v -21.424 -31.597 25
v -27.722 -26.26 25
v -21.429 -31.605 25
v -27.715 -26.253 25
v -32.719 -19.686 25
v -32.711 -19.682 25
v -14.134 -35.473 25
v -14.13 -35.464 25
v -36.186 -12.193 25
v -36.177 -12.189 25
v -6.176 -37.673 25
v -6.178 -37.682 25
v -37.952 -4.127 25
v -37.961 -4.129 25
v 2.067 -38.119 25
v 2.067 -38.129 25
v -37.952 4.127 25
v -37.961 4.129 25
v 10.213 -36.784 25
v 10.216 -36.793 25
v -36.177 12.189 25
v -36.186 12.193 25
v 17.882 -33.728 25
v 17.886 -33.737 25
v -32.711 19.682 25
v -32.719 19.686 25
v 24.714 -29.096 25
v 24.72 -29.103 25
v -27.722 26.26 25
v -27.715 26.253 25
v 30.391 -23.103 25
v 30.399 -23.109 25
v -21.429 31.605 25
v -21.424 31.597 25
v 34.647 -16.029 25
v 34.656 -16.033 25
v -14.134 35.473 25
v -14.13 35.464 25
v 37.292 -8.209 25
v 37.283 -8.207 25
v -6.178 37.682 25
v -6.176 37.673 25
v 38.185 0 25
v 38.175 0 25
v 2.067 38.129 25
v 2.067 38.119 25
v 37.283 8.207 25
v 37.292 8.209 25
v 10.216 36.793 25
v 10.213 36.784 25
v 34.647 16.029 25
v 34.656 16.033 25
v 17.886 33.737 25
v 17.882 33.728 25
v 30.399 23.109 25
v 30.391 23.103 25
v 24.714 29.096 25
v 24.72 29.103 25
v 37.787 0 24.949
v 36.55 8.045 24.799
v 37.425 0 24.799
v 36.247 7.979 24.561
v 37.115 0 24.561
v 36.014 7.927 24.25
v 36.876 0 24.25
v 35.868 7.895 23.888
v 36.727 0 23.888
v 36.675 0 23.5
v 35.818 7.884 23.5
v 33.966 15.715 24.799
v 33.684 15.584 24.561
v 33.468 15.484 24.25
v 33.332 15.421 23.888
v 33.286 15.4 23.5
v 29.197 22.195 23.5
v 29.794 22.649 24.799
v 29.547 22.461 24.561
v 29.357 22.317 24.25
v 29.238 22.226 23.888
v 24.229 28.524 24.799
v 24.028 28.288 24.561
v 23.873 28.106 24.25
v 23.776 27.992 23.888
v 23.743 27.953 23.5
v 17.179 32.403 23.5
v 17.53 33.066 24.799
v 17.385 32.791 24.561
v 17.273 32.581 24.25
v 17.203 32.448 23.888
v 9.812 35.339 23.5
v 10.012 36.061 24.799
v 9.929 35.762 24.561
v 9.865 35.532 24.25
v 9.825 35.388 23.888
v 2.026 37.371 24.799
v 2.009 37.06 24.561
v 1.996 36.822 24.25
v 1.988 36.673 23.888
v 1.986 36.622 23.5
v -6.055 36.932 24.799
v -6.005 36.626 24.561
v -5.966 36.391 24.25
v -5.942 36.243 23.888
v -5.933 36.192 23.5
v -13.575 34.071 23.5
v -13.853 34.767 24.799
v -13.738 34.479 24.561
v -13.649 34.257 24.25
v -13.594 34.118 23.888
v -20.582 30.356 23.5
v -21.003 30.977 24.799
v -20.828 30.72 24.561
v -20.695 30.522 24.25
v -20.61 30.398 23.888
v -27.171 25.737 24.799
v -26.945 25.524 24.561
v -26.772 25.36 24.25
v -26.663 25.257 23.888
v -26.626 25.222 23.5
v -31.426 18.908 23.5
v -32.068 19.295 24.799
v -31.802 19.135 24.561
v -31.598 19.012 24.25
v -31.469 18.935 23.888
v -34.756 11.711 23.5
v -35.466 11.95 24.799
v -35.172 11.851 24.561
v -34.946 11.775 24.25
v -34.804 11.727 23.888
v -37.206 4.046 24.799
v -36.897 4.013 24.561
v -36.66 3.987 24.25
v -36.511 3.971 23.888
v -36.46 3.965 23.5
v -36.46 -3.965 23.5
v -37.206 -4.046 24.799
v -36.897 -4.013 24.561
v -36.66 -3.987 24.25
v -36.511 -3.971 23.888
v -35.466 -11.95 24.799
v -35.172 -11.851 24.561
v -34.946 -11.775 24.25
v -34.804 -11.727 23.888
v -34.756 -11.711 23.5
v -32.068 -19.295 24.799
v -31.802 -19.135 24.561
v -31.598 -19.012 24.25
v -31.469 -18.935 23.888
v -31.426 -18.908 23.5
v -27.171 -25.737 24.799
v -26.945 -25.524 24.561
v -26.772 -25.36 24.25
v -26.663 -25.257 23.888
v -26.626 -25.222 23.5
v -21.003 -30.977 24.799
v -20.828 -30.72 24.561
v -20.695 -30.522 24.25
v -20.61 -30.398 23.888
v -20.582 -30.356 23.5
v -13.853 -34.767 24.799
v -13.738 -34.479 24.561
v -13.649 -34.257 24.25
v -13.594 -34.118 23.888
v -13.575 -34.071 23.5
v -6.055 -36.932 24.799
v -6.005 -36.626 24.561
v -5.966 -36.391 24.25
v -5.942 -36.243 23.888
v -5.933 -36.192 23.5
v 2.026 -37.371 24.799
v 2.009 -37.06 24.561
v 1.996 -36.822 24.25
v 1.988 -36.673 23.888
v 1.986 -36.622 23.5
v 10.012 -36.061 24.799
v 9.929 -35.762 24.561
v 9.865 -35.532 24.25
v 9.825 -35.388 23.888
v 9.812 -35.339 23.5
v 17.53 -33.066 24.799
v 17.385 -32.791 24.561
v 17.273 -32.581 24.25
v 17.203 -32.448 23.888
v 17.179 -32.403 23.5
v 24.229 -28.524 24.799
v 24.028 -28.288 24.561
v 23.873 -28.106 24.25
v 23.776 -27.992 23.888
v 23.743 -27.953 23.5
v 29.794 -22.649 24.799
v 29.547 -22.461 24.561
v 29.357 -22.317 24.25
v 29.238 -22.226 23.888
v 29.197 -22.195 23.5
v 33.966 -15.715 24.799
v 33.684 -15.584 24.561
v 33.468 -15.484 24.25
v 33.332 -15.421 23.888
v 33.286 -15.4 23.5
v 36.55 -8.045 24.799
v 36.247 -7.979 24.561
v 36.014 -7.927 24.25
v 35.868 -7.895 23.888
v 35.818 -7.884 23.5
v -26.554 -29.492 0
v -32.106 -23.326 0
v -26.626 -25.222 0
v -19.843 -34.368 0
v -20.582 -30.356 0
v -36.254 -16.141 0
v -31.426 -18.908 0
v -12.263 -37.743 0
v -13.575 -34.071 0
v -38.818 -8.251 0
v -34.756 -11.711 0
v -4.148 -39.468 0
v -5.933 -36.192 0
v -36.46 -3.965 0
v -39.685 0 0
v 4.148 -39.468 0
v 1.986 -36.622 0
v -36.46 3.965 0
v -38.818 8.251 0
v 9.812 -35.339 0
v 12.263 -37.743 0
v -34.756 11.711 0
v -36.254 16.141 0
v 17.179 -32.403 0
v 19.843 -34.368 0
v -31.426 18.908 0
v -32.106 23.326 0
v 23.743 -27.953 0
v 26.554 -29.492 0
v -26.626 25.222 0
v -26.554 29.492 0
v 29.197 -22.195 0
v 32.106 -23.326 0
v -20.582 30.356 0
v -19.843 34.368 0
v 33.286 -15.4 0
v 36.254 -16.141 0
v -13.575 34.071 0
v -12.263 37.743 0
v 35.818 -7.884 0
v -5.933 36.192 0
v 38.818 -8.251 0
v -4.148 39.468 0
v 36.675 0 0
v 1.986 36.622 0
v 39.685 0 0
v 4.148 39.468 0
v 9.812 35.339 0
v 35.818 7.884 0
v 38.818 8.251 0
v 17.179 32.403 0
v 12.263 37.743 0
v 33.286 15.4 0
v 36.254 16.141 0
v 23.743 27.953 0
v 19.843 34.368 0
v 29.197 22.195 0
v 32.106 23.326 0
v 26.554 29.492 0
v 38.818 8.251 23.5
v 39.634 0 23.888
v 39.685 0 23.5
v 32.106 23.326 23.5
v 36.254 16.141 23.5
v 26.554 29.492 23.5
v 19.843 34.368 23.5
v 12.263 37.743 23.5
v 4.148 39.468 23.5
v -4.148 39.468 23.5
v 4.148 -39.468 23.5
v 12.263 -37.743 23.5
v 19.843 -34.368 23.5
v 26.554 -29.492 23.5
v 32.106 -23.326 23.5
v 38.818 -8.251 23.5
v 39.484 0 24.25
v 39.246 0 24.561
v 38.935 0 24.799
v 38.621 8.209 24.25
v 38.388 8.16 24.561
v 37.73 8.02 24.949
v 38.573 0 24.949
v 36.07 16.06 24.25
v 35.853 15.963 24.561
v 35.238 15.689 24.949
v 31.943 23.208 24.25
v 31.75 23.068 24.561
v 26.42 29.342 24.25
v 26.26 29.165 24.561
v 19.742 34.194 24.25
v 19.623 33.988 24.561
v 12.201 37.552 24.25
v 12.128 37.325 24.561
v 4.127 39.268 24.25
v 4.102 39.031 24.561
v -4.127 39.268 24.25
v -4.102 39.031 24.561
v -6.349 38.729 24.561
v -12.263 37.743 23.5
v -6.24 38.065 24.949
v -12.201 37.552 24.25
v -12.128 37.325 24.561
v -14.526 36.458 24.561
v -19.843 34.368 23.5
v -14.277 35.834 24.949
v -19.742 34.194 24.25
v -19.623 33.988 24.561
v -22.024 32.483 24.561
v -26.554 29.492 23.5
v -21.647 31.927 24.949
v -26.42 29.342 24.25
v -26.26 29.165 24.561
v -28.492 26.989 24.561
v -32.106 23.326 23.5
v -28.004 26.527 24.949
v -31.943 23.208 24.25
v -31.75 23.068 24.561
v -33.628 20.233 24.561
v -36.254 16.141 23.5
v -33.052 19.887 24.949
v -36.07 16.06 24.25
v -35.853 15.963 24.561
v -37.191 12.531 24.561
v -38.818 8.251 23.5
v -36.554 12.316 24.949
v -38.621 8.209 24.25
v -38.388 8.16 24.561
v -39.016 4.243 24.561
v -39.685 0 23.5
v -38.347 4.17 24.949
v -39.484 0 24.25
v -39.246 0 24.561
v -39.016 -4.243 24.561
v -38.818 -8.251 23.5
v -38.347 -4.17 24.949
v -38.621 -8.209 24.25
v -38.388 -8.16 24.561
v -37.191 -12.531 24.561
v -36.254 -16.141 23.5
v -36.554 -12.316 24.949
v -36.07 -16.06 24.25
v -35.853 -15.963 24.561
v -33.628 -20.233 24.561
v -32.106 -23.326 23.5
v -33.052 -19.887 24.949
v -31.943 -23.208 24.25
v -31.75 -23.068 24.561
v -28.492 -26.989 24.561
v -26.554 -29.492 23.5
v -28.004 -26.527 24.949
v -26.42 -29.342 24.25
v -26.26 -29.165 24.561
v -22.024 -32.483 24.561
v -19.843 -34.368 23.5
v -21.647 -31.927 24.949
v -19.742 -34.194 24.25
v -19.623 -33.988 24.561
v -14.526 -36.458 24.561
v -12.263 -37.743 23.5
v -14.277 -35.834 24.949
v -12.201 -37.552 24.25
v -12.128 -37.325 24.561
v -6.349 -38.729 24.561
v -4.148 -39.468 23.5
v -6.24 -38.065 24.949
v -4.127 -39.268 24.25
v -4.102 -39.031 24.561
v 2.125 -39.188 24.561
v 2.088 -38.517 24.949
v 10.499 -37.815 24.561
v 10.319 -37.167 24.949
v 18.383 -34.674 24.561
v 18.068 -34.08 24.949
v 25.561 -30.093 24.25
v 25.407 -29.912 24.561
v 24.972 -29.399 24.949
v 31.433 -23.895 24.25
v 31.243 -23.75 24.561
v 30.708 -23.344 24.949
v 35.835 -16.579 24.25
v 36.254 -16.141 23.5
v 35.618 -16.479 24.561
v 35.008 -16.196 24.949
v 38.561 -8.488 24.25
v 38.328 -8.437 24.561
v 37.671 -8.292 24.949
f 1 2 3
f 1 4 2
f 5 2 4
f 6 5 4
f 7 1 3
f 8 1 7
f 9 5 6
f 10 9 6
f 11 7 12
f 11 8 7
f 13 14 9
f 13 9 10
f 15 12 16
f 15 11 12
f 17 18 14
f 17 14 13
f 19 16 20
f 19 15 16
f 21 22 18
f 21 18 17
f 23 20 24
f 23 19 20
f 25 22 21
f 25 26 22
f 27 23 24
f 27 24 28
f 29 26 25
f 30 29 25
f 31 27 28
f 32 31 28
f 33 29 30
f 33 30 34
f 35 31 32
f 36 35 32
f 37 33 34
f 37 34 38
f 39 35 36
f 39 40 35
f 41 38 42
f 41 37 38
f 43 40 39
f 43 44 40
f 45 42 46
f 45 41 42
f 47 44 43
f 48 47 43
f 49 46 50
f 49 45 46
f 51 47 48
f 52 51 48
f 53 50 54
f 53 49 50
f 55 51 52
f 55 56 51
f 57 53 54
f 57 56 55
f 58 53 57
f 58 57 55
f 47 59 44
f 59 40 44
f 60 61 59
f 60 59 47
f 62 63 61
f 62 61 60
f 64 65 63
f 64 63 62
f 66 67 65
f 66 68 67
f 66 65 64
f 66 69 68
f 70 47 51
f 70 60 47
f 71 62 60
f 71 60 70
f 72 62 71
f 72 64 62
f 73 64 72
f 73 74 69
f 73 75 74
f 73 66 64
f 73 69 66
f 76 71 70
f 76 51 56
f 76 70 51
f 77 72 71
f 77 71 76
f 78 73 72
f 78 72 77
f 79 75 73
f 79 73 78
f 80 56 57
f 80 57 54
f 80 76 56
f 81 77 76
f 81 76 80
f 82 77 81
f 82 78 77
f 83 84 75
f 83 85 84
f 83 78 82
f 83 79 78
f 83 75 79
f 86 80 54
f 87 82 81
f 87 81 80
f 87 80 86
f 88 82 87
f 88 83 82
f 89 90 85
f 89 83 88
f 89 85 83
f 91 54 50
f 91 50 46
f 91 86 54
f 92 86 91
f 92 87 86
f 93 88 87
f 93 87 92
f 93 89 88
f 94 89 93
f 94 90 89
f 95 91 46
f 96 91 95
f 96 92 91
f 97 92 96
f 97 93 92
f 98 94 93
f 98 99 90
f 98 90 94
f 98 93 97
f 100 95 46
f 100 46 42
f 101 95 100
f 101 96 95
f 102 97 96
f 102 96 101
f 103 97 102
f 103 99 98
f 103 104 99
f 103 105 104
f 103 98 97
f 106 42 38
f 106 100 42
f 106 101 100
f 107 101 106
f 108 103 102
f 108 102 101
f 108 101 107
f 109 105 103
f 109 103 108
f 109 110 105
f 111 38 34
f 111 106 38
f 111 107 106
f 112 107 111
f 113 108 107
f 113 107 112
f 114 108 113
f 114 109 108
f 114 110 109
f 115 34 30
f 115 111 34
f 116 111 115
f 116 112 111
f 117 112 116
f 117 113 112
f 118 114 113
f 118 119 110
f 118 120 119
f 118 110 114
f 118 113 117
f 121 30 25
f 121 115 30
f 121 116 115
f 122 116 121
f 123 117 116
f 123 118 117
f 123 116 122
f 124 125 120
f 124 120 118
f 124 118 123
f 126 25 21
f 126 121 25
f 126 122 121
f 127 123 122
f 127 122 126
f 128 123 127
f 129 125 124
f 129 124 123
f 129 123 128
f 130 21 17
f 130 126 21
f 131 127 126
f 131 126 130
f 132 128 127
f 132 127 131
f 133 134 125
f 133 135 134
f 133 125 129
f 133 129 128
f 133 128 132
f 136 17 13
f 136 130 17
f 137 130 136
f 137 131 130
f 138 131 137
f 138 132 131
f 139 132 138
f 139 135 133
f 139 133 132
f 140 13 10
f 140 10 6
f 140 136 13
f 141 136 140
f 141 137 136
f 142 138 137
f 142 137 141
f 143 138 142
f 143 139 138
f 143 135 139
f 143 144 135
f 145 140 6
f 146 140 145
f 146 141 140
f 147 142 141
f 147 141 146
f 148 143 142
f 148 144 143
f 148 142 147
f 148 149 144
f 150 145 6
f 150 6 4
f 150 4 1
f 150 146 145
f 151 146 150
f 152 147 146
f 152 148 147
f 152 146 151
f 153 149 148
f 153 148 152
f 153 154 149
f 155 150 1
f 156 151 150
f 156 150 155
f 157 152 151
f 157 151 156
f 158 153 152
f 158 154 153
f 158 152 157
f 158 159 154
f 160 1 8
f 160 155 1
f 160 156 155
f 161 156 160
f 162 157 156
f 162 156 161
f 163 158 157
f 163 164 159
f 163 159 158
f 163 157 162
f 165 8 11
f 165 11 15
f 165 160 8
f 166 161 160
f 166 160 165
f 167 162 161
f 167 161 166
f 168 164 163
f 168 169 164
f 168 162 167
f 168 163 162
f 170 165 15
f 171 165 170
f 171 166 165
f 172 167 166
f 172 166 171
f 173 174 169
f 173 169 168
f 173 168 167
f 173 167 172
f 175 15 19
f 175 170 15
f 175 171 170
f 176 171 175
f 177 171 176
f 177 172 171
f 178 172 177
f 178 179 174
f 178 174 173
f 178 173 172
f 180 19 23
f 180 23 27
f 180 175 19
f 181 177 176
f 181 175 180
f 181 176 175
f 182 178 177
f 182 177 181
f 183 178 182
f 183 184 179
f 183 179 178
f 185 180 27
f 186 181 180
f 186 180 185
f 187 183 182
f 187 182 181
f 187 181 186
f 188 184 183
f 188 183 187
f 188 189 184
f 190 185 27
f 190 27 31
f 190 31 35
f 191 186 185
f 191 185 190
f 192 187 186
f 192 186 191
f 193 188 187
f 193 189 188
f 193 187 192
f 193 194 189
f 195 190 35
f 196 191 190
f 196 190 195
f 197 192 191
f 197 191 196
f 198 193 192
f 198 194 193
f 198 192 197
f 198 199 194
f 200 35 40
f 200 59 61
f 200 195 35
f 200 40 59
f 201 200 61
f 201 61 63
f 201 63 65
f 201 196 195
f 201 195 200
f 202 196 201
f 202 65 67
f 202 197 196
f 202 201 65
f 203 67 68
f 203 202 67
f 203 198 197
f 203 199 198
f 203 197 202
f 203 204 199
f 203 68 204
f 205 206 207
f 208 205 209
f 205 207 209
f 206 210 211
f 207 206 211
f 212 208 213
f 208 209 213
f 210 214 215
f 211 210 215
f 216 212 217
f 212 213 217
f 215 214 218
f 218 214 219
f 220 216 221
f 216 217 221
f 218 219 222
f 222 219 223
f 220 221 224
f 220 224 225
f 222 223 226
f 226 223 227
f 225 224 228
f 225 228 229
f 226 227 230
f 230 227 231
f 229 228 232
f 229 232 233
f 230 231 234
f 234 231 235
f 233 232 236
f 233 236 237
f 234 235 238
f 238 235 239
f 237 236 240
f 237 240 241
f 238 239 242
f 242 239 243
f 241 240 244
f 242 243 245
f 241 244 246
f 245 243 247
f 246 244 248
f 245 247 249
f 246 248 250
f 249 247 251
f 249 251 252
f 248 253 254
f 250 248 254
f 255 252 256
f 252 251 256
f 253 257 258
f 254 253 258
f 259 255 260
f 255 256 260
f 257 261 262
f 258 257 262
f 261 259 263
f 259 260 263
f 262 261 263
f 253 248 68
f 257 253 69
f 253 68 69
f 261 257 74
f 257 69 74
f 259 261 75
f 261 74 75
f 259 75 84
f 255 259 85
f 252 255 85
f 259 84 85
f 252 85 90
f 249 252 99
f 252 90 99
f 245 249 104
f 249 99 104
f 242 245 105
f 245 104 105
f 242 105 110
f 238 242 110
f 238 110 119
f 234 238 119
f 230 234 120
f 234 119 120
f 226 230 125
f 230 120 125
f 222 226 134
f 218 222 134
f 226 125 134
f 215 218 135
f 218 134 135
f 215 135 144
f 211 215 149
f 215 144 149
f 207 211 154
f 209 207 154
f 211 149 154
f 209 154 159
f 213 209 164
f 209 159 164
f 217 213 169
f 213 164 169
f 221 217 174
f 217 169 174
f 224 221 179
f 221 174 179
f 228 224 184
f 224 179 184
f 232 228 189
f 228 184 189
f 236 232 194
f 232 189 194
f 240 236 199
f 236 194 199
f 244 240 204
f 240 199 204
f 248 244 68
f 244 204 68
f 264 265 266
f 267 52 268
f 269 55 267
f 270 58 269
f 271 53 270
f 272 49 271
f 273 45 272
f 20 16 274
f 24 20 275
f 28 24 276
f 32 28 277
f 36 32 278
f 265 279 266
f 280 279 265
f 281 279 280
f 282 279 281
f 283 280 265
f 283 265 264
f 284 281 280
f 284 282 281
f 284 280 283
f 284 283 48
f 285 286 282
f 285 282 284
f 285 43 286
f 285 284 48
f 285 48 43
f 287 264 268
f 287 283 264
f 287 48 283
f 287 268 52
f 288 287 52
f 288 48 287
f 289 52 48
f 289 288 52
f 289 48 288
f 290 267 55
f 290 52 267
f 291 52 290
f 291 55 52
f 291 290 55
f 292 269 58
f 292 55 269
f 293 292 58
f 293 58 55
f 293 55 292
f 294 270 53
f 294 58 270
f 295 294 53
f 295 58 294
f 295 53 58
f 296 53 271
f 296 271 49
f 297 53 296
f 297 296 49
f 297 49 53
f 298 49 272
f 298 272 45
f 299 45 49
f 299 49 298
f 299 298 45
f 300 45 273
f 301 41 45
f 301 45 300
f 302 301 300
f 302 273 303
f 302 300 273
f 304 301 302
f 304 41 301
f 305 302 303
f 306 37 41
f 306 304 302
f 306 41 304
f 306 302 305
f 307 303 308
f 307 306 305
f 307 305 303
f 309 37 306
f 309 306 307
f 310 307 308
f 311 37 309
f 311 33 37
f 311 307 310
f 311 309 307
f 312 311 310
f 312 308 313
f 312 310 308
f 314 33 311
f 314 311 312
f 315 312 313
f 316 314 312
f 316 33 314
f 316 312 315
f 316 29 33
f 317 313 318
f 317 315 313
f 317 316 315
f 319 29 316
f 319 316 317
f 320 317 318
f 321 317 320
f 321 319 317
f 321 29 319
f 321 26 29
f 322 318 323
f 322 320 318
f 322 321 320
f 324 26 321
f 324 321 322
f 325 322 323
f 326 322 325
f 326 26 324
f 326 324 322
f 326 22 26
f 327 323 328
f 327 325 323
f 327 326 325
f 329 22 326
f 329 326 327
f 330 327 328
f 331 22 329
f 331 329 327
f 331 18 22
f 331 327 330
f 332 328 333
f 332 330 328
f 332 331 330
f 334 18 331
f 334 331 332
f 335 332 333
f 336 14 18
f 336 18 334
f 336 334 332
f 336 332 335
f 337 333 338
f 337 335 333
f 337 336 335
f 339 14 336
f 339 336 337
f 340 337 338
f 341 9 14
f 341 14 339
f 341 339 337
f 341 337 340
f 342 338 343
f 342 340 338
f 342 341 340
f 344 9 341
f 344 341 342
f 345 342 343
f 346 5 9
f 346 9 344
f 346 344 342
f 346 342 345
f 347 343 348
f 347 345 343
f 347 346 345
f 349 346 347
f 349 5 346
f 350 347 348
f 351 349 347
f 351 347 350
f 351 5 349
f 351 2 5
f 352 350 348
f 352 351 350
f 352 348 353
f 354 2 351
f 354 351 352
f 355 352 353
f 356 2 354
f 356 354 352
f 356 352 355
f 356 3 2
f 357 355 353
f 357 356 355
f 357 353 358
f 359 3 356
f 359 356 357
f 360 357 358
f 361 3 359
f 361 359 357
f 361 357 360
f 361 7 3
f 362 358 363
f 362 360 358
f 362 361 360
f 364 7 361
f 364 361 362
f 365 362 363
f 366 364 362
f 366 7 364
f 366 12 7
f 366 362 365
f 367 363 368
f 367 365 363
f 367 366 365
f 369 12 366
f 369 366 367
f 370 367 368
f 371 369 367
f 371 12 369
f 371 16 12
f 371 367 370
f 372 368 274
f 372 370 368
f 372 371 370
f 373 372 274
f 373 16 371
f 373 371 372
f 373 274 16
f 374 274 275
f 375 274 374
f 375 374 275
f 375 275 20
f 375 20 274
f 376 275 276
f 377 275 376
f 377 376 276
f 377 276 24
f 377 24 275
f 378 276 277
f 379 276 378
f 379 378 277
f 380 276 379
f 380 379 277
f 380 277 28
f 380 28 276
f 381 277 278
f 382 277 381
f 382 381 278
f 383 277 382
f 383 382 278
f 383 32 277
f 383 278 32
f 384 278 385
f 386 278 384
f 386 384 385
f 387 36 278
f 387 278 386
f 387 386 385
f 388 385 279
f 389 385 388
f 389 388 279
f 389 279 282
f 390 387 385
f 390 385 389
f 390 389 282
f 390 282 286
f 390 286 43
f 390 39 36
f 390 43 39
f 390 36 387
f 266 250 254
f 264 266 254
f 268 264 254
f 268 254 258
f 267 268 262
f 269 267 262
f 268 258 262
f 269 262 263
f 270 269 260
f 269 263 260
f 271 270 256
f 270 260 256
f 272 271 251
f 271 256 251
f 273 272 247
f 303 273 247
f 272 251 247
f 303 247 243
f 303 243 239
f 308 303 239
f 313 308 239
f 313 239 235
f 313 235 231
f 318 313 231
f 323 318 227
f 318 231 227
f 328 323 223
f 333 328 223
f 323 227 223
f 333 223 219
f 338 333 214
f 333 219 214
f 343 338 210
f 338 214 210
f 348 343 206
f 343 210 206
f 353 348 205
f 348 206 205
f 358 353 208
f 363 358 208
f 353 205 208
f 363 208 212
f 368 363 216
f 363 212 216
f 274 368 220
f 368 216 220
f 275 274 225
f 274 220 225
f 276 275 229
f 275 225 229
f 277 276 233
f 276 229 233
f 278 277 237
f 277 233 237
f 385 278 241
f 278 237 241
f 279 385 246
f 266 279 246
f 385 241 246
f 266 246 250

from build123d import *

# Parameters (mm, degrees)
F0_R     = 39.685
F1_DEPTH = 25
F2_R     = 36.675481
F3_DEPTH = 25
F4_R     = 1.5


with BuildPart() as f1:
    # F0 (on Top) → F1 (new body)
    with BuildSketch(Plane.XY):
        Circle(F0_R)
    extrude(amount=F1_DEPTH)

    # F2 (on face) → F3 (cut)
    with BuildSketch(Plane.XY.offset(25)):
        Circle(F2_R)
    extrude(amount=-F3_DEPTH, mode=Mode.SUBTRACT)

    # F4
    f4_edges = [f1.edges().sort_by_distance(p)[0] for p in [
        (-36.675481, 0, 25),
        (-39.685, 0, 25),
    ]]
    fillet(f4_edges, radius=F4_R)


solid = f1.part
